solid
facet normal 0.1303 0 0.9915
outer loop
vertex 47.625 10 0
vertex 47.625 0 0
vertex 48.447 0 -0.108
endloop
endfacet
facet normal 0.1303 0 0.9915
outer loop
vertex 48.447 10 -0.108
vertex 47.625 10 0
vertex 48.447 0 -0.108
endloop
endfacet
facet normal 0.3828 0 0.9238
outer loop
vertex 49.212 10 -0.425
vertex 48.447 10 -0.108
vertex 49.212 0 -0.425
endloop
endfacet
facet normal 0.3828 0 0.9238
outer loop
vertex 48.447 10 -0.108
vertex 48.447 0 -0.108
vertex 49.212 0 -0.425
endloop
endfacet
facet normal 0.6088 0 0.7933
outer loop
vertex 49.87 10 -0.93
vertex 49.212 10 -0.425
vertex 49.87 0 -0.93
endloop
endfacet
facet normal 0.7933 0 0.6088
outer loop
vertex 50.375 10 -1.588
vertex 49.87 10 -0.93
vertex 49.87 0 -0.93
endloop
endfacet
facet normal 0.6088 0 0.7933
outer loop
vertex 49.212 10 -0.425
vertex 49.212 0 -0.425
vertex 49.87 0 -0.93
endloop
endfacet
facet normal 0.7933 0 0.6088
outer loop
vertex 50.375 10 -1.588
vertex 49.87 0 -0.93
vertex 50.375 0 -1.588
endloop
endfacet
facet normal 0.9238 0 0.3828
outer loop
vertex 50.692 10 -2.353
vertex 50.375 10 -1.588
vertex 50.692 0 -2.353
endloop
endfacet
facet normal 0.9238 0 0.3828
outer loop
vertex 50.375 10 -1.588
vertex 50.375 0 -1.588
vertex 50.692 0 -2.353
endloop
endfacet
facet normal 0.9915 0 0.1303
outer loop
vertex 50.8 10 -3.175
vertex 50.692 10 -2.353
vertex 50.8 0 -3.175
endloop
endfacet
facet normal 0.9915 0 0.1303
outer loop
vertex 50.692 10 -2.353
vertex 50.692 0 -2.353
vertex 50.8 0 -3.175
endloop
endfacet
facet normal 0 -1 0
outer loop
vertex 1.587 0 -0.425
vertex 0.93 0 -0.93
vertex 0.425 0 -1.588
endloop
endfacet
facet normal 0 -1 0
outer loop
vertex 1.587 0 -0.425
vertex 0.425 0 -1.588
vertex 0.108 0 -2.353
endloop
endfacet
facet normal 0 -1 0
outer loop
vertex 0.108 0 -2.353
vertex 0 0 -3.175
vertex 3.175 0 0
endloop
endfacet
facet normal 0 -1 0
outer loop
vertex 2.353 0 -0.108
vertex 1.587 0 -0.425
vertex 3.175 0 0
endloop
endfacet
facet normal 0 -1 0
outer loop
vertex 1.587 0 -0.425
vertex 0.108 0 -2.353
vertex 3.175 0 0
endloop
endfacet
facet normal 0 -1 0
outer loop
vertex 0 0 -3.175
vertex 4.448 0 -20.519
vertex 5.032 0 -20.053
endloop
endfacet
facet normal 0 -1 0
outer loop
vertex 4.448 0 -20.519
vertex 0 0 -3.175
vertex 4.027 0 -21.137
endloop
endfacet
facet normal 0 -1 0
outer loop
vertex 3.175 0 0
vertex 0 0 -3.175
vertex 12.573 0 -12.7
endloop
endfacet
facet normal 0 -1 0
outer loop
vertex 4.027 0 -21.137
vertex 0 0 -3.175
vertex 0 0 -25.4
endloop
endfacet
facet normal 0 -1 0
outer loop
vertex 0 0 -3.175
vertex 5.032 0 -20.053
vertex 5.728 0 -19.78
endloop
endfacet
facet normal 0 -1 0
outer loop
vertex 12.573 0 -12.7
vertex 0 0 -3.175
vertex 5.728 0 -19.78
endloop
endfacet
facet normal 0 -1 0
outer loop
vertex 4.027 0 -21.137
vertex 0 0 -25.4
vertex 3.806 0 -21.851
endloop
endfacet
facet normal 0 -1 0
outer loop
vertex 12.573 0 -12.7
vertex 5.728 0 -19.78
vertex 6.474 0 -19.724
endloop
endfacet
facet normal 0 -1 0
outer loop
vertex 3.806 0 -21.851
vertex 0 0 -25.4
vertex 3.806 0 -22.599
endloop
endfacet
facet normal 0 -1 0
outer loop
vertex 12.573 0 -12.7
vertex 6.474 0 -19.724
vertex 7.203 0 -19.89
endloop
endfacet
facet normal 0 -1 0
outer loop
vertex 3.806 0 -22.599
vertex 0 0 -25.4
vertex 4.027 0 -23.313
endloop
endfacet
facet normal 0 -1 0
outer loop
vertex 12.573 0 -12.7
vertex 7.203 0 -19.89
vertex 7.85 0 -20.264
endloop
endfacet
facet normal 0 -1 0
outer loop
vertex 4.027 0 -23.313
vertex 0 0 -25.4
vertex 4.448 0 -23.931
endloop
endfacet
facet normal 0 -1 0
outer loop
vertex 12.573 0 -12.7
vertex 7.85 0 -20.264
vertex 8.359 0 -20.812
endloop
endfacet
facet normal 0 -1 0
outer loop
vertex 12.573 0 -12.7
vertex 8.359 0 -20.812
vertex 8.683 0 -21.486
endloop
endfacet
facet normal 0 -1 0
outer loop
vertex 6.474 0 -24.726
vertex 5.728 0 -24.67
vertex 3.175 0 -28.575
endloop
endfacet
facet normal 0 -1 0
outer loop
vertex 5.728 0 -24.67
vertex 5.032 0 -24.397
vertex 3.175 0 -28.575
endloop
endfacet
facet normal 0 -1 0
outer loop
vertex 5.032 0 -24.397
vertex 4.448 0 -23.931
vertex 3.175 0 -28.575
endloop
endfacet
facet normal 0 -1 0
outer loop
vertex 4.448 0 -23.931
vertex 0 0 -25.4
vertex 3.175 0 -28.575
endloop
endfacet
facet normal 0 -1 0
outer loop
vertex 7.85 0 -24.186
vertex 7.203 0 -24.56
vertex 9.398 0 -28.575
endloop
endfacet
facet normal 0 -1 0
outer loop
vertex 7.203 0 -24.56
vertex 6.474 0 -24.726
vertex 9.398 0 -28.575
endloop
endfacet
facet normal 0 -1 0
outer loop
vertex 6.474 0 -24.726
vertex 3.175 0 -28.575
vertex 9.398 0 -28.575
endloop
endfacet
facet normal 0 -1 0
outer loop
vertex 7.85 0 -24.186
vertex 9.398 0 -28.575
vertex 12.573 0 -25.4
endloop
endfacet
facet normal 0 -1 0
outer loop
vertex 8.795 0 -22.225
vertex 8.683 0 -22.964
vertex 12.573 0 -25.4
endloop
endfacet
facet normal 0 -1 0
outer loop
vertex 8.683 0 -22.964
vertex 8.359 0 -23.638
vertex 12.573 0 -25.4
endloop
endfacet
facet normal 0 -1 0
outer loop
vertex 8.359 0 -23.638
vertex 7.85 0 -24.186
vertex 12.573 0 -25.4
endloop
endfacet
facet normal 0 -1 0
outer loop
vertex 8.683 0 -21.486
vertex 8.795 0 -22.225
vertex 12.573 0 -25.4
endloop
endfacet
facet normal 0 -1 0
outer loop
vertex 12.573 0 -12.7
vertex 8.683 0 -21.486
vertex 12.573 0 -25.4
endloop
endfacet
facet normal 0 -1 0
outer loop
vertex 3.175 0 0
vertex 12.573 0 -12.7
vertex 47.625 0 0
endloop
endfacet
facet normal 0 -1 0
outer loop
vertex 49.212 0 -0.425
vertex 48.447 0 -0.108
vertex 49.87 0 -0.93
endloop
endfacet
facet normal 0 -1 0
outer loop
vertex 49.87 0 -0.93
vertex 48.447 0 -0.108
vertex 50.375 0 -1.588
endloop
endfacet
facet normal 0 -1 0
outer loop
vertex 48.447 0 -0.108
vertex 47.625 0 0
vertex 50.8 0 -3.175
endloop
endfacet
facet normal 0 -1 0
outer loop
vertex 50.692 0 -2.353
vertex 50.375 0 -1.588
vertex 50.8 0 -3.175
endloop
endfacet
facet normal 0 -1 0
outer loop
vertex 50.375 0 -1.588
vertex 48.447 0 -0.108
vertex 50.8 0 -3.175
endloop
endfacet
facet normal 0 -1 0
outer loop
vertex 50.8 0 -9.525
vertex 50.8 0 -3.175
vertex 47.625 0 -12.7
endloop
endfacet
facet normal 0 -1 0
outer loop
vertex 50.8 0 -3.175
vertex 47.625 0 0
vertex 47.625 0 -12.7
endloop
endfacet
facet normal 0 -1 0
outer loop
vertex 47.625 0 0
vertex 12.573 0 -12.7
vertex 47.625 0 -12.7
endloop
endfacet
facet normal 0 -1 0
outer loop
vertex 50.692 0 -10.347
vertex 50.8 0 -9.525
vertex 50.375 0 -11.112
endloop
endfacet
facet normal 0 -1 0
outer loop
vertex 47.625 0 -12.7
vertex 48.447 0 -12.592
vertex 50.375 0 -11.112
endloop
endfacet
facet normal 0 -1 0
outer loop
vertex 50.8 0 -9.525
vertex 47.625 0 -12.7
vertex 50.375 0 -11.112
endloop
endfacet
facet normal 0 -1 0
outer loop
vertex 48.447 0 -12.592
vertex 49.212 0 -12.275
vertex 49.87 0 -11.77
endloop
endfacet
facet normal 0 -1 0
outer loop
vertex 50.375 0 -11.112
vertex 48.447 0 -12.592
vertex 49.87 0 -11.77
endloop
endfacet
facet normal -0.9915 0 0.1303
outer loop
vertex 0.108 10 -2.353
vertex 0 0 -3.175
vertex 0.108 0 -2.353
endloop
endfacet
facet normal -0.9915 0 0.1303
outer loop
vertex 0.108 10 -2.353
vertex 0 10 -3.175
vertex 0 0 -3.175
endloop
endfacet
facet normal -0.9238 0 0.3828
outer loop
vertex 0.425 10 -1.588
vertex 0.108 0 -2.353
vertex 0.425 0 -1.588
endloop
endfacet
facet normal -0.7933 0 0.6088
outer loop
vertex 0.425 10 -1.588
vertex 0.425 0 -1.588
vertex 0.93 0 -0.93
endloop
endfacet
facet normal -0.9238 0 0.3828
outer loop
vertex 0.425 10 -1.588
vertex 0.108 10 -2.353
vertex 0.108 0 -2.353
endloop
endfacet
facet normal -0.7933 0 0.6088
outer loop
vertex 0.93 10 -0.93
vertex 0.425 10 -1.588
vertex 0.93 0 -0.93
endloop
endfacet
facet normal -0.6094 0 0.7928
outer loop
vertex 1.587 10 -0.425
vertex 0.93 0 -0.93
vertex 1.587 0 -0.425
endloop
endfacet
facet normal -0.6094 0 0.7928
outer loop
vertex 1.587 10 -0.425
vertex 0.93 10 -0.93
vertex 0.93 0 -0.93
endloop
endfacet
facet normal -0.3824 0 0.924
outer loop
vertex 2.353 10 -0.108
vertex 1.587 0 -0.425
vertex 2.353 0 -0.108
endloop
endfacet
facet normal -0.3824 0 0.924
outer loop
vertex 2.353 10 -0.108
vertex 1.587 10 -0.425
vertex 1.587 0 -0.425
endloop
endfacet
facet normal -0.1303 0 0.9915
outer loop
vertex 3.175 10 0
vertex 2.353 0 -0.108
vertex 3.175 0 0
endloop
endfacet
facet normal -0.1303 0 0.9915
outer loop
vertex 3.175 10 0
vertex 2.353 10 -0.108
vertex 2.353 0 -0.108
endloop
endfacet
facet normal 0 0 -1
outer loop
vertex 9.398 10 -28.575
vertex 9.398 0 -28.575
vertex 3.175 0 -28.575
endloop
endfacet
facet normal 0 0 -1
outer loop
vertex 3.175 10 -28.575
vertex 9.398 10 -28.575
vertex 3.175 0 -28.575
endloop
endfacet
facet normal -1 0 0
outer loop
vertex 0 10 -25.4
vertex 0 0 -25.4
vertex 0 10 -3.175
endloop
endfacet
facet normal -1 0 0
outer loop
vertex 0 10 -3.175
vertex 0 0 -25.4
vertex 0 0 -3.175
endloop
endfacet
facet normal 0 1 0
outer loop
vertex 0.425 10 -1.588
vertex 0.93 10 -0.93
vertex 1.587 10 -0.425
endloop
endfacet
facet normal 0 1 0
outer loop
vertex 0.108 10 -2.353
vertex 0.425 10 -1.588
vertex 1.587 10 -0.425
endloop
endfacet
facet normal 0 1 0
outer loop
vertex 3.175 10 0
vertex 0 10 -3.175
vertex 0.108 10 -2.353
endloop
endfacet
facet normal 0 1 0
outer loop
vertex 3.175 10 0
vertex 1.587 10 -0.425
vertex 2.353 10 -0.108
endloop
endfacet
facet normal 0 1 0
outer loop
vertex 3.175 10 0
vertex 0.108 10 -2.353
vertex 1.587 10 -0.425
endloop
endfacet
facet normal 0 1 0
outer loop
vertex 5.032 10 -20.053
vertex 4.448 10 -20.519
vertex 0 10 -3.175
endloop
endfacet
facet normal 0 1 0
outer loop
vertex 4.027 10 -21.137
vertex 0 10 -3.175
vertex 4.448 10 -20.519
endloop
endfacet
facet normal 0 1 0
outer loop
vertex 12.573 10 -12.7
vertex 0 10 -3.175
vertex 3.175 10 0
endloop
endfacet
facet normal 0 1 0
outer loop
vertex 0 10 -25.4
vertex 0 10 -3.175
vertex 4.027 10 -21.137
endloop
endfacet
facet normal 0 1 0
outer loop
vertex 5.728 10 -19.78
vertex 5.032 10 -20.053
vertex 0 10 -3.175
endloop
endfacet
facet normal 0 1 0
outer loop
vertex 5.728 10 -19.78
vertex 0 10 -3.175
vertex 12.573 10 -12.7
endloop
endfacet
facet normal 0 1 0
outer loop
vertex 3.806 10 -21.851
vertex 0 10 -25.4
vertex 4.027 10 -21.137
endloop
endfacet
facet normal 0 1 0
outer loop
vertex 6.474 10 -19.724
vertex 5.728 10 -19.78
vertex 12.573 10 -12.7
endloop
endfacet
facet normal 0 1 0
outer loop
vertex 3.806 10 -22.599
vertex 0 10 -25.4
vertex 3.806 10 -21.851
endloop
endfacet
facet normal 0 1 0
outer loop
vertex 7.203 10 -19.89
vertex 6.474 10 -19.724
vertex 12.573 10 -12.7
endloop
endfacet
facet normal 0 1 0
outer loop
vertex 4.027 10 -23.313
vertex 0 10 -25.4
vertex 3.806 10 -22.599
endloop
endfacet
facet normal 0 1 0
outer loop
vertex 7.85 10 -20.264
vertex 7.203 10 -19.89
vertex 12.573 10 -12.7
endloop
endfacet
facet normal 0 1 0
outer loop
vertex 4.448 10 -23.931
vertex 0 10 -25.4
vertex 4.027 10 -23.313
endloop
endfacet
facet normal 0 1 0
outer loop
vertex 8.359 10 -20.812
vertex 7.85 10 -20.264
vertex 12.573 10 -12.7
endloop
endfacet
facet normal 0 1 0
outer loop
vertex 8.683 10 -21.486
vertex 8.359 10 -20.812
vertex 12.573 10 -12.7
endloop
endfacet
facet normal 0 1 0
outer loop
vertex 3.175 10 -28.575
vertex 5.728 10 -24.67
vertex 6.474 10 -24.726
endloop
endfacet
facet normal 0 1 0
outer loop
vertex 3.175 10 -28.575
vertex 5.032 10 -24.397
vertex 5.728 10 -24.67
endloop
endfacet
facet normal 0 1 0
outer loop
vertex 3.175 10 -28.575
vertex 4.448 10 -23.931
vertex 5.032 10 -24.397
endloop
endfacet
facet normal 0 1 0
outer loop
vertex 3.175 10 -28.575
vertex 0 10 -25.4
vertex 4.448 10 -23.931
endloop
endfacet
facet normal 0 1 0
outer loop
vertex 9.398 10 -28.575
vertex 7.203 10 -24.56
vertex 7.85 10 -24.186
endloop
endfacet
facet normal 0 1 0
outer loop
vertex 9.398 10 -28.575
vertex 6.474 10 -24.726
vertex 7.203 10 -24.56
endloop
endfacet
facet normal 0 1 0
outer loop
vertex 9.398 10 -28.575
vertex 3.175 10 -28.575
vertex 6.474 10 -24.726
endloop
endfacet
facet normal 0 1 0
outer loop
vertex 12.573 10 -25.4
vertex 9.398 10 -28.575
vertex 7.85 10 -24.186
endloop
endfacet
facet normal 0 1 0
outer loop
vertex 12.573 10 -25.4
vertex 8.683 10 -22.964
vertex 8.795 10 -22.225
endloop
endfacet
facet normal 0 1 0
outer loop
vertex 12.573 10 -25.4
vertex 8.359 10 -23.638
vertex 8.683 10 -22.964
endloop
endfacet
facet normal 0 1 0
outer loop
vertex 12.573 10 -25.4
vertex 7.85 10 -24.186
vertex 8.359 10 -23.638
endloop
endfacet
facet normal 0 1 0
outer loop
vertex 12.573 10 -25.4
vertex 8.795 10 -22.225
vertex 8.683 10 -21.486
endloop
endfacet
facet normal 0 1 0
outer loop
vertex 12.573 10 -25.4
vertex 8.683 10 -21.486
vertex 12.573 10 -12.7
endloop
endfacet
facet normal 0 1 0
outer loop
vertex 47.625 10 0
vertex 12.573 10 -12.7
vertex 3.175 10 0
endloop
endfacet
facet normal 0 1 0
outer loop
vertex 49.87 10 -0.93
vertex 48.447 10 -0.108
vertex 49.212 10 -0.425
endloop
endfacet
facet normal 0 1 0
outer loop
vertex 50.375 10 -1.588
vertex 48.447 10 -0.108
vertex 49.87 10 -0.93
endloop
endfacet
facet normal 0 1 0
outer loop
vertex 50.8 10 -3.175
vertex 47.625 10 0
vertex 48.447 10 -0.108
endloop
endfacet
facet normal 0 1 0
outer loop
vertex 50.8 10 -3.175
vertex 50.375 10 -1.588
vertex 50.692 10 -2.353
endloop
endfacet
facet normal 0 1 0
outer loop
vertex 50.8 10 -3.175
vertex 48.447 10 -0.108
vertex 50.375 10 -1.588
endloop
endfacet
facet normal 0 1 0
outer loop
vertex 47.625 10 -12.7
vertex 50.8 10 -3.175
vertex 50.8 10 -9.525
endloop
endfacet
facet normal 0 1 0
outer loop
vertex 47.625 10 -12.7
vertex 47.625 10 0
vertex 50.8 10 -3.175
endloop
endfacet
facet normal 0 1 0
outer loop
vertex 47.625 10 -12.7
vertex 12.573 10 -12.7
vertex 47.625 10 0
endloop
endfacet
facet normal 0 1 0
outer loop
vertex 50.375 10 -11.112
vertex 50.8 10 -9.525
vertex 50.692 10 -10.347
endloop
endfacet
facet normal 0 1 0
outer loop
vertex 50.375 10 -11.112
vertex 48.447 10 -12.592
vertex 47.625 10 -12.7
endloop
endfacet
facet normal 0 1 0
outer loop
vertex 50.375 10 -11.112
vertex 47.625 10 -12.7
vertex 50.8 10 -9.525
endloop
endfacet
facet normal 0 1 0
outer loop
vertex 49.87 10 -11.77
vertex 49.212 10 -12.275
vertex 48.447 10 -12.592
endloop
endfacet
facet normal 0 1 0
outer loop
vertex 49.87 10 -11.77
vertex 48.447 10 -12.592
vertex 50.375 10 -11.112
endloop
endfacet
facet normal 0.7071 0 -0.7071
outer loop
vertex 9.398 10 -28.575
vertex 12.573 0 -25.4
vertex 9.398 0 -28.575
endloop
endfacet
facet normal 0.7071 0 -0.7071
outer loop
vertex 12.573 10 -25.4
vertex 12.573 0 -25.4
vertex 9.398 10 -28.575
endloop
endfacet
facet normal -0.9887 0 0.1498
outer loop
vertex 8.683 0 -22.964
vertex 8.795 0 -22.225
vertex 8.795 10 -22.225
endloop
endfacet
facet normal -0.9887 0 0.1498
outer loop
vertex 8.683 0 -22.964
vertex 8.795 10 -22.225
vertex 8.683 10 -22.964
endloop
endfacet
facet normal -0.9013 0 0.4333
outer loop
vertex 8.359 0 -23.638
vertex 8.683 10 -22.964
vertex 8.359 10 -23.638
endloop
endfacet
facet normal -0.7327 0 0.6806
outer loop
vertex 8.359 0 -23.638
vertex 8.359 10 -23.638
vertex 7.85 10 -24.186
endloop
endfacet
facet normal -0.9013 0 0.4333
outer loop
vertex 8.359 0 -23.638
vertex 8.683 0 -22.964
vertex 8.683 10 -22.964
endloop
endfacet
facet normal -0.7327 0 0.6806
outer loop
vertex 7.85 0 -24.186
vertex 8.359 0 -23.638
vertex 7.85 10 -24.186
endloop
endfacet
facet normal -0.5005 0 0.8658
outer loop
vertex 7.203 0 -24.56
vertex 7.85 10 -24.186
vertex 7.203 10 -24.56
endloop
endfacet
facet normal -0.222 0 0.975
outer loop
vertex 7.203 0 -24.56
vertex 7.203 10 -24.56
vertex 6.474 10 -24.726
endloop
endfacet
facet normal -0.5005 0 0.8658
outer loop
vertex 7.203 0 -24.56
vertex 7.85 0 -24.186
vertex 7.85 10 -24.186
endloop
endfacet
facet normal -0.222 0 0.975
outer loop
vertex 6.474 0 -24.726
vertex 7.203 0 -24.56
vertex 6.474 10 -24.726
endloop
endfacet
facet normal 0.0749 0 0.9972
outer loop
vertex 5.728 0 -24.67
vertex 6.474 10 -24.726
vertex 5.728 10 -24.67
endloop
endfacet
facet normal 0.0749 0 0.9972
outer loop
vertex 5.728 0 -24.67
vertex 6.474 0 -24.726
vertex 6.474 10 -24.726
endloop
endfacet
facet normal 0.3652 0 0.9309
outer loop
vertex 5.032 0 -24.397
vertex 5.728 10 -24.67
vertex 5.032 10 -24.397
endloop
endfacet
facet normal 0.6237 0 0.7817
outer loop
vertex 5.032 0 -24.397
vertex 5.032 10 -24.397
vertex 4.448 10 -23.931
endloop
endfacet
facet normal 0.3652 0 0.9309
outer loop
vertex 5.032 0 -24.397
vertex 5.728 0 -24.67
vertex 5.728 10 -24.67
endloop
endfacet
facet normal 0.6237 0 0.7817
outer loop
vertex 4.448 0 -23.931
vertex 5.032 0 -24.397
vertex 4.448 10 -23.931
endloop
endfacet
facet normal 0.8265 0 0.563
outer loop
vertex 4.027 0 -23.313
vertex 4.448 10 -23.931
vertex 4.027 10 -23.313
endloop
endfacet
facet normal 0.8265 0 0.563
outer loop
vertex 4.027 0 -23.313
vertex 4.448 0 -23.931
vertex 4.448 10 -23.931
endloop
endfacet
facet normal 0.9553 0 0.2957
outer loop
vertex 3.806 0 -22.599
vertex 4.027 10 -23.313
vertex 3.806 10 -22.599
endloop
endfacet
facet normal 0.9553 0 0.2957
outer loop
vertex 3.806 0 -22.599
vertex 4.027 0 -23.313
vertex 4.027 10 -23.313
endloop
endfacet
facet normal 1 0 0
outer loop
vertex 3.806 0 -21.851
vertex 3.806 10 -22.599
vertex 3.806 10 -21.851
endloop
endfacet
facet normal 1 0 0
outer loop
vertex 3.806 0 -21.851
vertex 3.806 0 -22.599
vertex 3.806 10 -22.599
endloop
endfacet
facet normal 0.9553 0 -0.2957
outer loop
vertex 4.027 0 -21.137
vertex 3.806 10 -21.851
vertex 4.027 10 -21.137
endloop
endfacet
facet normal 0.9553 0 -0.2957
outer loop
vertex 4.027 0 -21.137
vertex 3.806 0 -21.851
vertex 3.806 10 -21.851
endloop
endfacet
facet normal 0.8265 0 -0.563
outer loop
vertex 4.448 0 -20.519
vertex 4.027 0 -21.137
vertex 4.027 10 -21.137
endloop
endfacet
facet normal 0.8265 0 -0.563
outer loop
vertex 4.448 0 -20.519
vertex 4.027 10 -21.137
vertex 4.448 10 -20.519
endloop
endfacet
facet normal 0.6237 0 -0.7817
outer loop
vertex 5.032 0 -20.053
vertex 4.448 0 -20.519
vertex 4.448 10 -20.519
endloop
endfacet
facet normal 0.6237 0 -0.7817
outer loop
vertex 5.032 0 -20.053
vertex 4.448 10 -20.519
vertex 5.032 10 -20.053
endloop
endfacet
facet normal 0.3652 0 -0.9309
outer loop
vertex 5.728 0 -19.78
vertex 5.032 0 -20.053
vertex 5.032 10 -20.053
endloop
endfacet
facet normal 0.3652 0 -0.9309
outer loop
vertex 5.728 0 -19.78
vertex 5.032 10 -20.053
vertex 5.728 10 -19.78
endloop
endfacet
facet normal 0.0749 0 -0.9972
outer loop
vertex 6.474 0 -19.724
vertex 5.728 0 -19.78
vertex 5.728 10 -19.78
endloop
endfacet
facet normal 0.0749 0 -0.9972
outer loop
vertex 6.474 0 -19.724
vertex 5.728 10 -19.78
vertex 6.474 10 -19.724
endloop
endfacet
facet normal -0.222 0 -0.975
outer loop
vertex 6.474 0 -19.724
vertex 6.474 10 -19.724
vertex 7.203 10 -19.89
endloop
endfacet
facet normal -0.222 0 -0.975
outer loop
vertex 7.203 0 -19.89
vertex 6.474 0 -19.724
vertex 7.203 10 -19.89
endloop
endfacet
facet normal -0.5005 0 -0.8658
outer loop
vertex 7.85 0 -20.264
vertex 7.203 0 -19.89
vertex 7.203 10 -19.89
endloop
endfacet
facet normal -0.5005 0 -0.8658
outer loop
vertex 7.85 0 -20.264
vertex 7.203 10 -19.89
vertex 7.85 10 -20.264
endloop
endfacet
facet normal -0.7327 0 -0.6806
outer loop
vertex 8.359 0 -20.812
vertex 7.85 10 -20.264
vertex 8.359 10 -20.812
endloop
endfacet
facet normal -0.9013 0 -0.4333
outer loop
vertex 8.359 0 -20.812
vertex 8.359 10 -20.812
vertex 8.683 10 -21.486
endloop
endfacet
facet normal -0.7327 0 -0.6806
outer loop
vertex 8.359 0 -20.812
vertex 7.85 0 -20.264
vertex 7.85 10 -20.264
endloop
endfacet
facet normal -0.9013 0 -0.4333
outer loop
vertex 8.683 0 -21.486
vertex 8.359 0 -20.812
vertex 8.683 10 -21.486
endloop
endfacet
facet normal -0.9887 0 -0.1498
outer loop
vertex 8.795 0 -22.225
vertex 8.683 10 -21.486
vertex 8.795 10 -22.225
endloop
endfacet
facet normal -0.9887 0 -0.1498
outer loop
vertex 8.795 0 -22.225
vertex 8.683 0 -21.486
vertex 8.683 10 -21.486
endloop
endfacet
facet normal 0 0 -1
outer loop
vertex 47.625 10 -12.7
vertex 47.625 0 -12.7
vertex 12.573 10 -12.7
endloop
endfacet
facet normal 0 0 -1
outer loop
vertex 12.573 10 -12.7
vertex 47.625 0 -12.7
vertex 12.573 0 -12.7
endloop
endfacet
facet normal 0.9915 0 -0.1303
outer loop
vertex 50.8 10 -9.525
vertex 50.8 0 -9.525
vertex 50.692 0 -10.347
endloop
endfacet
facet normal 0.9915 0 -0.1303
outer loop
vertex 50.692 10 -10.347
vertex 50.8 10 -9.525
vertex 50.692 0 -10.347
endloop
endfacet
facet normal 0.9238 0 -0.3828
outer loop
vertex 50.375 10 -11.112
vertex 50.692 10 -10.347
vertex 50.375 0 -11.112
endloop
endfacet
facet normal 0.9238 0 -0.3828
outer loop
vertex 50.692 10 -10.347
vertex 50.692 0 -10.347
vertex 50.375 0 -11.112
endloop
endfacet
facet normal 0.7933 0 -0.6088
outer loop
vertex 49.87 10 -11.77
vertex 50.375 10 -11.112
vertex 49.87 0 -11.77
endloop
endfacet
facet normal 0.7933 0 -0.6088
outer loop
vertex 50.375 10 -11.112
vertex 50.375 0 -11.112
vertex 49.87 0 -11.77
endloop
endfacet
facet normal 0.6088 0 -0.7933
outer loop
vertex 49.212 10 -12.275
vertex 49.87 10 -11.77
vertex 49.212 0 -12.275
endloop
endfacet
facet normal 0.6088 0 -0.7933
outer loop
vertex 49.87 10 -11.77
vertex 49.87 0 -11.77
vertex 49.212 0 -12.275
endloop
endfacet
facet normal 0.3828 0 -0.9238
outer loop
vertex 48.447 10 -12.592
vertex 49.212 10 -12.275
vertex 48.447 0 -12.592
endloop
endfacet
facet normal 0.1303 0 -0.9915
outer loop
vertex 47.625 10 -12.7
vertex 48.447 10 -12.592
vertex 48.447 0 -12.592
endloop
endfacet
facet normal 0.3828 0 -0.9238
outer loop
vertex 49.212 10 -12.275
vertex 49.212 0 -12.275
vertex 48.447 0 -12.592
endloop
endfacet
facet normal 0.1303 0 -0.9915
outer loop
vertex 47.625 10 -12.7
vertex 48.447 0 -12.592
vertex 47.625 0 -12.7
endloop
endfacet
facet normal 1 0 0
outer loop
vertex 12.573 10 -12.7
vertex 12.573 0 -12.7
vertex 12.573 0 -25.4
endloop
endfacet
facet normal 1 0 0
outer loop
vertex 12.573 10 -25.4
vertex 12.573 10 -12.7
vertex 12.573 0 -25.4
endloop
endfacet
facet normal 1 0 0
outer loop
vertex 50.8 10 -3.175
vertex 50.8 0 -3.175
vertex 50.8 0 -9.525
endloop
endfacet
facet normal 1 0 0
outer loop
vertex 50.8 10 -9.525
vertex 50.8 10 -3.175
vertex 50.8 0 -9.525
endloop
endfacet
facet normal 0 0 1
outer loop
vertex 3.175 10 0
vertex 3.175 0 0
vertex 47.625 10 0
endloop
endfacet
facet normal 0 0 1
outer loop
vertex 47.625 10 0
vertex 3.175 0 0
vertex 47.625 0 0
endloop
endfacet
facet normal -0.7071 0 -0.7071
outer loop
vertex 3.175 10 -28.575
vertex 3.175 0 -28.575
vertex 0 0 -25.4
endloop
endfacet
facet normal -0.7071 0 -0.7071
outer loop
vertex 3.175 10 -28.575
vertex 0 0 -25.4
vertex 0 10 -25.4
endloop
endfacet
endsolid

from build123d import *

# Parameters (mm, degrees)
SKETCH1_R           = 2.50825
BOSS_EXTRUDE1_DEPTH = 10
FILLET1_R           = 3.175
CHAMFER1_SIZE       = 3.175


with BuildPart() as part:
    # Sketch1 → Boss-Extrude1 (new body)
    with BuildSketch(Plane(origin=(0, 0, 0), x_dir=(1, 0, 0), z_dir=(0, 1, 0))):
        with BuildLine():
            Line((0, 28.575), (0, 0))
            Line((0, 0), (47.625, 0))
            ThreePointArc((47.625, 0), (49.87006403, 0.92993597), (50.8, 3.175))
            Line((50.8, 3.175), (50.8, 9.525))
            ThreePointArc((50.8, 9.525), (49.87006403, 11.77006403), (47.625, 12.7))
            Line((47.625, 12.7), (12.573, 12.7))
            Line((12.573, 12.7), (12.573, 28.575))
            Line((12.573, 28.575), (0, 28.575))
        make_face()
        with Locations((6.2865, 22.225)):
            Circle(SKETCH1_R, mode=Mode.SUBTRACT)
    extrude(amount=BOSS_EXTRUDE1_DEPTH)

    # Fillet1
    fillet1_edges = [part.edges().sort_by_distance(p)[0] for p in [
        (0, 5, 0),
    ]]
    fillet(fillet1_edges, radius=FILLET1_R)

    # Chamfer1
    chamfer1_edges = [part.edges().sort_by_distance(p)[0] for p in [
        (12.573, 5, -28.575),
        (0, 5, -28.575),
    ]]
    chamfer(chamfer1_edges, length=CHAMFER1_SIZE)


solid = part.part
